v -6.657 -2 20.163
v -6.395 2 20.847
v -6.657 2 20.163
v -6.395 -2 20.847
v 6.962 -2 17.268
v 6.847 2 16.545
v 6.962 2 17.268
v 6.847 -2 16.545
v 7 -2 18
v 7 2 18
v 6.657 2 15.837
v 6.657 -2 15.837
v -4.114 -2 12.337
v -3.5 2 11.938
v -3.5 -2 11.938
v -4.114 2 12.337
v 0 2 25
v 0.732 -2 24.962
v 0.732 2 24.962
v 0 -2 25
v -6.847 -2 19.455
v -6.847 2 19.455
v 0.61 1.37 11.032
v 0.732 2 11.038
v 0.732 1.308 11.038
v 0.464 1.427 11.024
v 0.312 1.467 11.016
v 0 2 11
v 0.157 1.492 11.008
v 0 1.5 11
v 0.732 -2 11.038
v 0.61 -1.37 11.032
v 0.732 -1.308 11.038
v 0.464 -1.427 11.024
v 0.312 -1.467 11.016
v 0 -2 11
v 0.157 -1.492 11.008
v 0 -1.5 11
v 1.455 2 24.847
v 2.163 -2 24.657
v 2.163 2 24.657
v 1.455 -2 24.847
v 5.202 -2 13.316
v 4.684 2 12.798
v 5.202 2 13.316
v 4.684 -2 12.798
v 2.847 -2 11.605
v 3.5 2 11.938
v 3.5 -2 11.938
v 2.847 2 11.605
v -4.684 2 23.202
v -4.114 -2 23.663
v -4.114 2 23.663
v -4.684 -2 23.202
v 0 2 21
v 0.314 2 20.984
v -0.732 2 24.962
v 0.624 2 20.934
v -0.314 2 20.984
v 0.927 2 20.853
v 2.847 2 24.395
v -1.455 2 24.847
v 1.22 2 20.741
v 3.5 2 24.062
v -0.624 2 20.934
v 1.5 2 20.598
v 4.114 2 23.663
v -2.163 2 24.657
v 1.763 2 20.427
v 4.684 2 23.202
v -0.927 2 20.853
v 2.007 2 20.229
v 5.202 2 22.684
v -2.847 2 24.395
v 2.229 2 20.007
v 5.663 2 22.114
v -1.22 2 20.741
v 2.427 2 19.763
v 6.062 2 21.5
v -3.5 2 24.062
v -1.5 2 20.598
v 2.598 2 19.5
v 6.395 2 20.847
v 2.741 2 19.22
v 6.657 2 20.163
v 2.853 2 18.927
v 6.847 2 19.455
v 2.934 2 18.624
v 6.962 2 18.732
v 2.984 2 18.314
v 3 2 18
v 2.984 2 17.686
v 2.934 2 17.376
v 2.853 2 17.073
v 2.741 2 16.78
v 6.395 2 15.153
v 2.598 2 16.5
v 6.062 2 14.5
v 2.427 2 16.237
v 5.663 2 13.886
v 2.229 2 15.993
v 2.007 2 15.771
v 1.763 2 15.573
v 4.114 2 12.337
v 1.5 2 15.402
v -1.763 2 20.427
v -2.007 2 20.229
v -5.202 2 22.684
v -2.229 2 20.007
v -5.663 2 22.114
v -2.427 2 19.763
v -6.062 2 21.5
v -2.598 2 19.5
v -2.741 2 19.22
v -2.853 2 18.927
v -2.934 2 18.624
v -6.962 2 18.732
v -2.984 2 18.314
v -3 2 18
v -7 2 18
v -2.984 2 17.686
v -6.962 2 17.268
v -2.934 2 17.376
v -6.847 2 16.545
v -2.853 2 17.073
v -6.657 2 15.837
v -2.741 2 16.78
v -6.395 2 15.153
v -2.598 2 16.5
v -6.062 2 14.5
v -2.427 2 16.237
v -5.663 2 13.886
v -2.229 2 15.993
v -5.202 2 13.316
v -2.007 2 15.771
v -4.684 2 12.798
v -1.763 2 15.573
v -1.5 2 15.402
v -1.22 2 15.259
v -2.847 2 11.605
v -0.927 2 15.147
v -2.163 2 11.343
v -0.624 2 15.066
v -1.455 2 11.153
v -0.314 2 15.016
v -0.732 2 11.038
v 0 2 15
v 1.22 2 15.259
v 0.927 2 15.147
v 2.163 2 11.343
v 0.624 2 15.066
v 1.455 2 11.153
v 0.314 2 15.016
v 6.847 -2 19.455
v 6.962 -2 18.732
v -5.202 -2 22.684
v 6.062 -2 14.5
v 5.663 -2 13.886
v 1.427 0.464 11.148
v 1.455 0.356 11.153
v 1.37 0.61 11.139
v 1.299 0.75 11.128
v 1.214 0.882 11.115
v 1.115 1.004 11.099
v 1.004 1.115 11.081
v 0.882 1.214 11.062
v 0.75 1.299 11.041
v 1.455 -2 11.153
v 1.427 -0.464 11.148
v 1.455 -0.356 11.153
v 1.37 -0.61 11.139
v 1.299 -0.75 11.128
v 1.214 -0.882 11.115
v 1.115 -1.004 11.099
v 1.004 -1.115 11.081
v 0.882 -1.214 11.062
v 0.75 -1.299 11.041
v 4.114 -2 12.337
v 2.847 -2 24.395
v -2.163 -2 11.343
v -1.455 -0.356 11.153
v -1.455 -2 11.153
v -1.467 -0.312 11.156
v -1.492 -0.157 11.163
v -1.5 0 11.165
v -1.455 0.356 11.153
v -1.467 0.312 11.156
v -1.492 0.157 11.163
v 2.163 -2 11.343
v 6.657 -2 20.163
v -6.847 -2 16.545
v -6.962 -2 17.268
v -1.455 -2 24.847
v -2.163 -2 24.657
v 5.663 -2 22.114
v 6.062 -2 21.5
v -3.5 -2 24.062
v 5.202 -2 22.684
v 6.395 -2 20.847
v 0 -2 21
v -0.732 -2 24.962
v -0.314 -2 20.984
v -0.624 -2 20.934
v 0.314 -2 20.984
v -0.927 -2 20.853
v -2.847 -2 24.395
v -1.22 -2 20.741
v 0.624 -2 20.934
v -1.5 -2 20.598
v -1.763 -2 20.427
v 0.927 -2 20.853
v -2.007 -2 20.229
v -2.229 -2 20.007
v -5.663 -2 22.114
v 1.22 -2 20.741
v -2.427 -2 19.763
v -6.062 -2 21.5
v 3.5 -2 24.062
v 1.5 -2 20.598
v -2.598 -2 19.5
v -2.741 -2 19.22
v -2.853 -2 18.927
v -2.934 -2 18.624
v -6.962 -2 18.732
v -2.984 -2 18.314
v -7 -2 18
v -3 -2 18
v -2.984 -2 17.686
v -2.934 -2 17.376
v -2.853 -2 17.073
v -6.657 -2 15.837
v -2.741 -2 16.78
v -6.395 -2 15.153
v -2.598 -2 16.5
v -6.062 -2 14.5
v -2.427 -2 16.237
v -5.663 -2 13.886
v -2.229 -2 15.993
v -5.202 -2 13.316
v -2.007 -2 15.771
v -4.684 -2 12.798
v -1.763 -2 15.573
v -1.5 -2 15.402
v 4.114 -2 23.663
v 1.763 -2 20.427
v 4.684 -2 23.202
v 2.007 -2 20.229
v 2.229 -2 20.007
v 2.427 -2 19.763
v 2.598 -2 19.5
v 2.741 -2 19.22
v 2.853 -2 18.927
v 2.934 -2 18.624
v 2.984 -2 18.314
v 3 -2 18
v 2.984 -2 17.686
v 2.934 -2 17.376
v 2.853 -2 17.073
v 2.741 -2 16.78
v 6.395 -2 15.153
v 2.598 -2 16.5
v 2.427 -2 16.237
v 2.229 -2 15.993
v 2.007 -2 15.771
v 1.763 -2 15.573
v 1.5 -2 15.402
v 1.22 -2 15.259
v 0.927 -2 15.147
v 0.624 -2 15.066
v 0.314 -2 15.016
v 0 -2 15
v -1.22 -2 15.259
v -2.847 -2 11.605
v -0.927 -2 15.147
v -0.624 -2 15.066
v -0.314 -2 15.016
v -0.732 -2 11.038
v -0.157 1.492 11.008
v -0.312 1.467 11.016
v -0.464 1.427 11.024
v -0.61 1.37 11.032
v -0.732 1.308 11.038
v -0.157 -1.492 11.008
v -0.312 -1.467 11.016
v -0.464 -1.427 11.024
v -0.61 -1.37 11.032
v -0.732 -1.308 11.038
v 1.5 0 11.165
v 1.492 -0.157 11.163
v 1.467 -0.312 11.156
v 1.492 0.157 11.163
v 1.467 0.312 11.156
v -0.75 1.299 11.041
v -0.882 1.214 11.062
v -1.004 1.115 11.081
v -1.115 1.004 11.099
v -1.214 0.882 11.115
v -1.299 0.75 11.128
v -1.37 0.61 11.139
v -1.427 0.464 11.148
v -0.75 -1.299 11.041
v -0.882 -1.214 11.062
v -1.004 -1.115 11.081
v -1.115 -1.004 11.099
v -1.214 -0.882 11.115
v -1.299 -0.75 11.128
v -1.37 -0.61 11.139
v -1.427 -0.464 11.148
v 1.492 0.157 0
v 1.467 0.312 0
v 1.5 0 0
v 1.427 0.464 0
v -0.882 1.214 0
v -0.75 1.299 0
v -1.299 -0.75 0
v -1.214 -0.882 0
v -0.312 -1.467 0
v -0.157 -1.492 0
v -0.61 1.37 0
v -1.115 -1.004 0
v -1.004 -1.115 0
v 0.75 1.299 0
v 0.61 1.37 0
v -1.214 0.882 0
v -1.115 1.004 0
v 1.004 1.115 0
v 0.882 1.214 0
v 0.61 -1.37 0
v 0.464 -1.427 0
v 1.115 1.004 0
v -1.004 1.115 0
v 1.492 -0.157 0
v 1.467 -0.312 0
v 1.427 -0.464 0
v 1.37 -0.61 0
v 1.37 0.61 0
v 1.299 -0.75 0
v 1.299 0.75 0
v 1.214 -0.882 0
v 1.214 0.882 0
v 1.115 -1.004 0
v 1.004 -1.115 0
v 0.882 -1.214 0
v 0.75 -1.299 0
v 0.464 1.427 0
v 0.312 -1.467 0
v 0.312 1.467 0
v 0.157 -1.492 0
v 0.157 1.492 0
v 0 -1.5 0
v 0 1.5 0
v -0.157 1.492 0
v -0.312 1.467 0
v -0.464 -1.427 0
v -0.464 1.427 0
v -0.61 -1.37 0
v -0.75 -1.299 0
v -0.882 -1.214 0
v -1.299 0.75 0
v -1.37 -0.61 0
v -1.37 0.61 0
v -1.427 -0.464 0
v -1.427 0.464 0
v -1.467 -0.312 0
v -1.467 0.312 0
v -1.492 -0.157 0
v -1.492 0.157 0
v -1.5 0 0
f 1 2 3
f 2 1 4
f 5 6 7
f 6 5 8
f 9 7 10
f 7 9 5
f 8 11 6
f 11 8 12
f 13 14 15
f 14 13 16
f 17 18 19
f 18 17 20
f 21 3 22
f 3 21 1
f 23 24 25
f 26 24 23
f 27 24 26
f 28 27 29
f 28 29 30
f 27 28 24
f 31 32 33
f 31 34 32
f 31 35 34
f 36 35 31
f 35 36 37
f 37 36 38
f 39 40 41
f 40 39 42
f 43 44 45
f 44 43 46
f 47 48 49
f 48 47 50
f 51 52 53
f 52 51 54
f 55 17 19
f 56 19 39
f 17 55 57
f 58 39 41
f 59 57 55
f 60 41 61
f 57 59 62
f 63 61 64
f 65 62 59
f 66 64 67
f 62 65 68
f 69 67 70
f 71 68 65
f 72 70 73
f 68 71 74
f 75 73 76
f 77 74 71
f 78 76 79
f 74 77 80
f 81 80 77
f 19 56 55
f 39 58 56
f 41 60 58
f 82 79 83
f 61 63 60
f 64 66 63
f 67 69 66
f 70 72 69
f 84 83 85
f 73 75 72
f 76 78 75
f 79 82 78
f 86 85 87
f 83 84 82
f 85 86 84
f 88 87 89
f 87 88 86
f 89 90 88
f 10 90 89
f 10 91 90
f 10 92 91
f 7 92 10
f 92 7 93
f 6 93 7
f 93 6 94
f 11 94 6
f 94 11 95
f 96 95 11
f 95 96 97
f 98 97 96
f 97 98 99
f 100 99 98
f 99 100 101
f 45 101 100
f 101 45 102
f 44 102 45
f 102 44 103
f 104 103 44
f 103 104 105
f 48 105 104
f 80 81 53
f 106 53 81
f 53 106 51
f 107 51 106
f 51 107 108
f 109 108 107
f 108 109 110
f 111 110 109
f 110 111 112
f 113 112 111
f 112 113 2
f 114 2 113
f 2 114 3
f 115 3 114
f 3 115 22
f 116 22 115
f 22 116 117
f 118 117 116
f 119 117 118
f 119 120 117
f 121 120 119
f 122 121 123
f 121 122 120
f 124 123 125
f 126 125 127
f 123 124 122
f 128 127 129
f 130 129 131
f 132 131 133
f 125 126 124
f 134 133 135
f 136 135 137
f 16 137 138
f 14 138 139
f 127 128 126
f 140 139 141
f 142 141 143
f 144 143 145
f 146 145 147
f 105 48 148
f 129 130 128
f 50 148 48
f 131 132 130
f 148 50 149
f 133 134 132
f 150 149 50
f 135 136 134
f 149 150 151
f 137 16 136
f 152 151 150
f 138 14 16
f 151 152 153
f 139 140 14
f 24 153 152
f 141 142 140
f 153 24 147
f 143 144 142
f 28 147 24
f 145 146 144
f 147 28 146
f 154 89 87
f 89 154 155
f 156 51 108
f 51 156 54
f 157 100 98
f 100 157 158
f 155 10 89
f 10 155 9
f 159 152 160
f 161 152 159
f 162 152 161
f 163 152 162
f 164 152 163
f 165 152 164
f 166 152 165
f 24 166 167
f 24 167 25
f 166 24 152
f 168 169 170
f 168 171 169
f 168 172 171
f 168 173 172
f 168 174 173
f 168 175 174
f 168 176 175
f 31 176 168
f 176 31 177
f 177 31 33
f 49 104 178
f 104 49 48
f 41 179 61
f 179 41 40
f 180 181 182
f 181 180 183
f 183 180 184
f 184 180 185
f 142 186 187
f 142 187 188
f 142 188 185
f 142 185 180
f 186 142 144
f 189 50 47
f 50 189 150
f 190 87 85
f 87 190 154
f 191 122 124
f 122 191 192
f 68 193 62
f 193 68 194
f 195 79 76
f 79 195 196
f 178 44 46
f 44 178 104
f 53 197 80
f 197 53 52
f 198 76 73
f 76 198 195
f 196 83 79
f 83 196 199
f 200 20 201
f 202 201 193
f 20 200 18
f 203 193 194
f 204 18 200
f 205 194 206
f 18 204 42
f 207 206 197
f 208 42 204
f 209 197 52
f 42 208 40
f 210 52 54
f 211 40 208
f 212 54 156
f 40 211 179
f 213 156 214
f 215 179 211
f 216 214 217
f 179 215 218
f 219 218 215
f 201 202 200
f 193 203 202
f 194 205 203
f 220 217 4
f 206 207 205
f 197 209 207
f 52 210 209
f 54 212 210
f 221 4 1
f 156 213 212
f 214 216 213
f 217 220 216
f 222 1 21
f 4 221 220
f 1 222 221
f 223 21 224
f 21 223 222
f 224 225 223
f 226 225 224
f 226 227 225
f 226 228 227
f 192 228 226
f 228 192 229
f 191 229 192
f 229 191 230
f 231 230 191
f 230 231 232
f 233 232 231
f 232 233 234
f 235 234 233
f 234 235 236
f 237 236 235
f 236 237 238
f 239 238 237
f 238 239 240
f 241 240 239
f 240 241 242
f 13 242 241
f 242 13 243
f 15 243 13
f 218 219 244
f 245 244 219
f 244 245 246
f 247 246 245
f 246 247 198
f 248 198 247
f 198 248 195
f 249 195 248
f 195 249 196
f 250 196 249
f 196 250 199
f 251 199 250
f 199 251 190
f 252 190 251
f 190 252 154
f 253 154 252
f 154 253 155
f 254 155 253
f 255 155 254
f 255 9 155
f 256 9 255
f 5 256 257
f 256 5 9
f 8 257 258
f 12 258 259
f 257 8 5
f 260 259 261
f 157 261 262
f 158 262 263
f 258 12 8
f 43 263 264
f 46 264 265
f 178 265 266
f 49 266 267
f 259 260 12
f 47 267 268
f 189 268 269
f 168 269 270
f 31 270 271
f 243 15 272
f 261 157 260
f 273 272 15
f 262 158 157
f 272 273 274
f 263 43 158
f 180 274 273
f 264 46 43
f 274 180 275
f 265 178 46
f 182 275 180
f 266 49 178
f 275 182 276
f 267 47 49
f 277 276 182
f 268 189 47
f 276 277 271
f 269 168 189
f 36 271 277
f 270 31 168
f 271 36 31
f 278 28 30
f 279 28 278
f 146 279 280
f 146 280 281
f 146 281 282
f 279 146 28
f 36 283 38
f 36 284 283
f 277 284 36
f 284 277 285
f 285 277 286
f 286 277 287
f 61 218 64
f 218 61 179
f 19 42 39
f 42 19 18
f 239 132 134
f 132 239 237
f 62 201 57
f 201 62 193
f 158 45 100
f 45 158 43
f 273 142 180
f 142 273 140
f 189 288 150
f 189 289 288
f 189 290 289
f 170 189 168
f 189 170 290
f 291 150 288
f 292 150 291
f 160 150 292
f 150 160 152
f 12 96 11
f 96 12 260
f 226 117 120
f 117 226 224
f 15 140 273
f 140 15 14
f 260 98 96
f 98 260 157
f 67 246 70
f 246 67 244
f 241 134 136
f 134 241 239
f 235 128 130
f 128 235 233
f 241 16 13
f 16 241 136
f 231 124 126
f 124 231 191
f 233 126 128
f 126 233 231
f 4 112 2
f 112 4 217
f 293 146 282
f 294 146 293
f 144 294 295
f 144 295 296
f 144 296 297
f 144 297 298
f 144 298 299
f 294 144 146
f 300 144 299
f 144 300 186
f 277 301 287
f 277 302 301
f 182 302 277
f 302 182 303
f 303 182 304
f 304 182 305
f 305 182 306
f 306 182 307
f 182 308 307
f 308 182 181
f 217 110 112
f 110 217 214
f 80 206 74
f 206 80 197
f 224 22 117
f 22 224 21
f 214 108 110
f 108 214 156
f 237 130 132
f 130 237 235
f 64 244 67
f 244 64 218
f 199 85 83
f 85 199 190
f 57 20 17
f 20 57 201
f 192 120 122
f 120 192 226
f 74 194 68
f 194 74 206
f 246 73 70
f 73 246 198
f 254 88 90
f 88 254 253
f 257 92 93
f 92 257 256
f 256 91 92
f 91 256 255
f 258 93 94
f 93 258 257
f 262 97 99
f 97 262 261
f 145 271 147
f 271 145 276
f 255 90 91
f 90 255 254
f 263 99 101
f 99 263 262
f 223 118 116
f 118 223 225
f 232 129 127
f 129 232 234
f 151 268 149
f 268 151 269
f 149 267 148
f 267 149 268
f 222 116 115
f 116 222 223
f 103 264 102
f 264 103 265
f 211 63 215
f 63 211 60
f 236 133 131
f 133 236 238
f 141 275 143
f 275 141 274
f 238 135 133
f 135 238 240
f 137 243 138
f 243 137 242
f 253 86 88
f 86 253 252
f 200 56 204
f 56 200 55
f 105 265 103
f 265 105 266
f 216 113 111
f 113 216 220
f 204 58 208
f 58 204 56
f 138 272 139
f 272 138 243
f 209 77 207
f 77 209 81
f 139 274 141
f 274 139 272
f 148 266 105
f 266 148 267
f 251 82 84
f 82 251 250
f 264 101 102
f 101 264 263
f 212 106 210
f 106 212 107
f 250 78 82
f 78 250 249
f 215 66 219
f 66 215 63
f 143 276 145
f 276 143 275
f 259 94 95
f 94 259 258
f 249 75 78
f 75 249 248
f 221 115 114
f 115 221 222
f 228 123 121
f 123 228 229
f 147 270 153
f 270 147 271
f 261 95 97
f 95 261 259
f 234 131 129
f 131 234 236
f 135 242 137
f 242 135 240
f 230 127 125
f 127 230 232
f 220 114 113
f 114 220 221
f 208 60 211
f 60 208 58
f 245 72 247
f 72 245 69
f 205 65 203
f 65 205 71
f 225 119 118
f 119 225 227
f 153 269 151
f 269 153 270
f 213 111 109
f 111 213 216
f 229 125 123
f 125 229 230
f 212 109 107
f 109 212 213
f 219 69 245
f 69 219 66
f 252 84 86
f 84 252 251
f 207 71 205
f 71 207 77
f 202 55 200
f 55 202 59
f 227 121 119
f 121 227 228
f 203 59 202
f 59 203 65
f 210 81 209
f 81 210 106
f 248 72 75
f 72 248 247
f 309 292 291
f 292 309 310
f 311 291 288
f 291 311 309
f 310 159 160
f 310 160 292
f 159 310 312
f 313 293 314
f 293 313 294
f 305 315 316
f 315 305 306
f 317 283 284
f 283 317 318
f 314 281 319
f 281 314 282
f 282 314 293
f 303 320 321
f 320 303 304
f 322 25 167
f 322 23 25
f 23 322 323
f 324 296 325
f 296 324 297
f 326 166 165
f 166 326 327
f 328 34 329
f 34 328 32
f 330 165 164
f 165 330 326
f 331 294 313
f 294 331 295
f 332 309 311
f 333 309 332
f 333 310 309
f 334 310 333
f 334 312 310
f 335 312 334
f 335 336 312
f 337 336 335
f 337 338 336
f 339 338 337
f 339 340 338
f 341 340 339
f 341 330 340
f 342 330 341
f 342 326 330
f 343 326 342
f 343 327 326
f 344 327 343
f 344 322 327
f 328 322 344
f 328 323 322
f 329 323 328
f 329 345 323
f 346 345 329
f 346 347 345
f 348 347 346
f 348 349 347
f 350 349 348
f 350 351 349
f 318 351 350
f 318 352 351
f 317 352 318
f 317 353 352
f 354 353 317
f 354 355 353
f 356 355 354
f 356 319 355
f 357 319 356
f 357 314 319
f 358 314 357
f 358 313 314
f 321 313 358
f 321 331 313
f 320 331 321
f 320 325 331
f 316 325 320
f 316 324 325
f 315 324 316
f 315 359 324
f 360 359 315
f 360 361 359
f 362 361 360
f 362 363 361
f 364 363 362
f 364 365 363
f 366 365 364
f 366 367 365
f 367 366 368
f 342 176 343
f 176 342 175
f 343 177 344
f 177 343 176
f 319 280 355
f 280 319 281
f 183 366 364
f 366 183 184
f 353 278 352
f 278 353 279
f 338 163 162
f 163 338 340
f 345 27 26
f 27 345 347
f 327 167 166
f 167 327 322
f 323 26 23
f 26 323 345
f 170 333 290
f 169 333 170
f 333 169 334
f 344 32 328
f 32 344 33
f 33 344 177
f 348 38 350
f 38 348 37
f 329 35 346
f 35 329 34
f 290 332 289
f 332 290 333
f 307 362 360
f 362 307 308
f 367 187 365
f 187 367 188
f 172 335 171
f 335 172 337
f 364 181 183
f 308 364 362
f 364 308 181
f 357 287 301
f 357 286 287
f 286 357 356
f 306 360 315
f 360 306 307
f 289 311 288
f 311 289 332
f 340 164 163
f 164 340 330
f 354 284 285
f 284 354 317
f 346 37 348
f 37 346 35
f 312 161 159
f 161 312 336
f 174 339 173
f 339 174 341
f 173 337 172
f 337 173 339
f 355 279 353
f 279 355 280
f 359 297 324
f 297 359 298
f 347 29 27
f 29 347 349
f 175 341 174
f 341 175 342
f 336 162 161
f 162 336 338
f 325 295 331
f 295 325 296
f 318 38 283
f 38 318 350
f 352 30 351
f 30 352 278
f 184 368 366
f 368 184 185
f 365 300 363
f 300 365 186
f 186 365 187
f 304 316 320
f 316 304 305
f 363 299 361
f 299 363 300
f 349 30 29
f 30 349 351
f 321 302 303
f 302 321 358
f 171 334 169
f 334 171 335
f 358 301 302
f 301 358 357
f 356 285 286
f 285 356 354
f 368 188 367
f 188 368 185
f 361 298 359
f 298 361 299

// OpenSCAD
// Flat-eye bolt with a smooth shaft.
$fn = 60;
eps = 0.02;
shaft_d = 3;
shaft_l = 12;
eye_outer_d = 14;
eye_inner_d = eye_outer_d - 2 * 4;
eye_t = 4;
module eye() {
    translate([0, -eye_t / 2, shaft_l + eye_outer_d / 2 - 1]) rotate([-90, 0, 0])
        difference() { cylinder(d = eye_outer_d, h = eye_t); translate([0, 0, -eps]) cylinder(d = eye_inner_d, h = eye_t + 2 * eps); }
}
union() { cylinder(d = shaft_d, h = shaft_l + 2); eye(); }
